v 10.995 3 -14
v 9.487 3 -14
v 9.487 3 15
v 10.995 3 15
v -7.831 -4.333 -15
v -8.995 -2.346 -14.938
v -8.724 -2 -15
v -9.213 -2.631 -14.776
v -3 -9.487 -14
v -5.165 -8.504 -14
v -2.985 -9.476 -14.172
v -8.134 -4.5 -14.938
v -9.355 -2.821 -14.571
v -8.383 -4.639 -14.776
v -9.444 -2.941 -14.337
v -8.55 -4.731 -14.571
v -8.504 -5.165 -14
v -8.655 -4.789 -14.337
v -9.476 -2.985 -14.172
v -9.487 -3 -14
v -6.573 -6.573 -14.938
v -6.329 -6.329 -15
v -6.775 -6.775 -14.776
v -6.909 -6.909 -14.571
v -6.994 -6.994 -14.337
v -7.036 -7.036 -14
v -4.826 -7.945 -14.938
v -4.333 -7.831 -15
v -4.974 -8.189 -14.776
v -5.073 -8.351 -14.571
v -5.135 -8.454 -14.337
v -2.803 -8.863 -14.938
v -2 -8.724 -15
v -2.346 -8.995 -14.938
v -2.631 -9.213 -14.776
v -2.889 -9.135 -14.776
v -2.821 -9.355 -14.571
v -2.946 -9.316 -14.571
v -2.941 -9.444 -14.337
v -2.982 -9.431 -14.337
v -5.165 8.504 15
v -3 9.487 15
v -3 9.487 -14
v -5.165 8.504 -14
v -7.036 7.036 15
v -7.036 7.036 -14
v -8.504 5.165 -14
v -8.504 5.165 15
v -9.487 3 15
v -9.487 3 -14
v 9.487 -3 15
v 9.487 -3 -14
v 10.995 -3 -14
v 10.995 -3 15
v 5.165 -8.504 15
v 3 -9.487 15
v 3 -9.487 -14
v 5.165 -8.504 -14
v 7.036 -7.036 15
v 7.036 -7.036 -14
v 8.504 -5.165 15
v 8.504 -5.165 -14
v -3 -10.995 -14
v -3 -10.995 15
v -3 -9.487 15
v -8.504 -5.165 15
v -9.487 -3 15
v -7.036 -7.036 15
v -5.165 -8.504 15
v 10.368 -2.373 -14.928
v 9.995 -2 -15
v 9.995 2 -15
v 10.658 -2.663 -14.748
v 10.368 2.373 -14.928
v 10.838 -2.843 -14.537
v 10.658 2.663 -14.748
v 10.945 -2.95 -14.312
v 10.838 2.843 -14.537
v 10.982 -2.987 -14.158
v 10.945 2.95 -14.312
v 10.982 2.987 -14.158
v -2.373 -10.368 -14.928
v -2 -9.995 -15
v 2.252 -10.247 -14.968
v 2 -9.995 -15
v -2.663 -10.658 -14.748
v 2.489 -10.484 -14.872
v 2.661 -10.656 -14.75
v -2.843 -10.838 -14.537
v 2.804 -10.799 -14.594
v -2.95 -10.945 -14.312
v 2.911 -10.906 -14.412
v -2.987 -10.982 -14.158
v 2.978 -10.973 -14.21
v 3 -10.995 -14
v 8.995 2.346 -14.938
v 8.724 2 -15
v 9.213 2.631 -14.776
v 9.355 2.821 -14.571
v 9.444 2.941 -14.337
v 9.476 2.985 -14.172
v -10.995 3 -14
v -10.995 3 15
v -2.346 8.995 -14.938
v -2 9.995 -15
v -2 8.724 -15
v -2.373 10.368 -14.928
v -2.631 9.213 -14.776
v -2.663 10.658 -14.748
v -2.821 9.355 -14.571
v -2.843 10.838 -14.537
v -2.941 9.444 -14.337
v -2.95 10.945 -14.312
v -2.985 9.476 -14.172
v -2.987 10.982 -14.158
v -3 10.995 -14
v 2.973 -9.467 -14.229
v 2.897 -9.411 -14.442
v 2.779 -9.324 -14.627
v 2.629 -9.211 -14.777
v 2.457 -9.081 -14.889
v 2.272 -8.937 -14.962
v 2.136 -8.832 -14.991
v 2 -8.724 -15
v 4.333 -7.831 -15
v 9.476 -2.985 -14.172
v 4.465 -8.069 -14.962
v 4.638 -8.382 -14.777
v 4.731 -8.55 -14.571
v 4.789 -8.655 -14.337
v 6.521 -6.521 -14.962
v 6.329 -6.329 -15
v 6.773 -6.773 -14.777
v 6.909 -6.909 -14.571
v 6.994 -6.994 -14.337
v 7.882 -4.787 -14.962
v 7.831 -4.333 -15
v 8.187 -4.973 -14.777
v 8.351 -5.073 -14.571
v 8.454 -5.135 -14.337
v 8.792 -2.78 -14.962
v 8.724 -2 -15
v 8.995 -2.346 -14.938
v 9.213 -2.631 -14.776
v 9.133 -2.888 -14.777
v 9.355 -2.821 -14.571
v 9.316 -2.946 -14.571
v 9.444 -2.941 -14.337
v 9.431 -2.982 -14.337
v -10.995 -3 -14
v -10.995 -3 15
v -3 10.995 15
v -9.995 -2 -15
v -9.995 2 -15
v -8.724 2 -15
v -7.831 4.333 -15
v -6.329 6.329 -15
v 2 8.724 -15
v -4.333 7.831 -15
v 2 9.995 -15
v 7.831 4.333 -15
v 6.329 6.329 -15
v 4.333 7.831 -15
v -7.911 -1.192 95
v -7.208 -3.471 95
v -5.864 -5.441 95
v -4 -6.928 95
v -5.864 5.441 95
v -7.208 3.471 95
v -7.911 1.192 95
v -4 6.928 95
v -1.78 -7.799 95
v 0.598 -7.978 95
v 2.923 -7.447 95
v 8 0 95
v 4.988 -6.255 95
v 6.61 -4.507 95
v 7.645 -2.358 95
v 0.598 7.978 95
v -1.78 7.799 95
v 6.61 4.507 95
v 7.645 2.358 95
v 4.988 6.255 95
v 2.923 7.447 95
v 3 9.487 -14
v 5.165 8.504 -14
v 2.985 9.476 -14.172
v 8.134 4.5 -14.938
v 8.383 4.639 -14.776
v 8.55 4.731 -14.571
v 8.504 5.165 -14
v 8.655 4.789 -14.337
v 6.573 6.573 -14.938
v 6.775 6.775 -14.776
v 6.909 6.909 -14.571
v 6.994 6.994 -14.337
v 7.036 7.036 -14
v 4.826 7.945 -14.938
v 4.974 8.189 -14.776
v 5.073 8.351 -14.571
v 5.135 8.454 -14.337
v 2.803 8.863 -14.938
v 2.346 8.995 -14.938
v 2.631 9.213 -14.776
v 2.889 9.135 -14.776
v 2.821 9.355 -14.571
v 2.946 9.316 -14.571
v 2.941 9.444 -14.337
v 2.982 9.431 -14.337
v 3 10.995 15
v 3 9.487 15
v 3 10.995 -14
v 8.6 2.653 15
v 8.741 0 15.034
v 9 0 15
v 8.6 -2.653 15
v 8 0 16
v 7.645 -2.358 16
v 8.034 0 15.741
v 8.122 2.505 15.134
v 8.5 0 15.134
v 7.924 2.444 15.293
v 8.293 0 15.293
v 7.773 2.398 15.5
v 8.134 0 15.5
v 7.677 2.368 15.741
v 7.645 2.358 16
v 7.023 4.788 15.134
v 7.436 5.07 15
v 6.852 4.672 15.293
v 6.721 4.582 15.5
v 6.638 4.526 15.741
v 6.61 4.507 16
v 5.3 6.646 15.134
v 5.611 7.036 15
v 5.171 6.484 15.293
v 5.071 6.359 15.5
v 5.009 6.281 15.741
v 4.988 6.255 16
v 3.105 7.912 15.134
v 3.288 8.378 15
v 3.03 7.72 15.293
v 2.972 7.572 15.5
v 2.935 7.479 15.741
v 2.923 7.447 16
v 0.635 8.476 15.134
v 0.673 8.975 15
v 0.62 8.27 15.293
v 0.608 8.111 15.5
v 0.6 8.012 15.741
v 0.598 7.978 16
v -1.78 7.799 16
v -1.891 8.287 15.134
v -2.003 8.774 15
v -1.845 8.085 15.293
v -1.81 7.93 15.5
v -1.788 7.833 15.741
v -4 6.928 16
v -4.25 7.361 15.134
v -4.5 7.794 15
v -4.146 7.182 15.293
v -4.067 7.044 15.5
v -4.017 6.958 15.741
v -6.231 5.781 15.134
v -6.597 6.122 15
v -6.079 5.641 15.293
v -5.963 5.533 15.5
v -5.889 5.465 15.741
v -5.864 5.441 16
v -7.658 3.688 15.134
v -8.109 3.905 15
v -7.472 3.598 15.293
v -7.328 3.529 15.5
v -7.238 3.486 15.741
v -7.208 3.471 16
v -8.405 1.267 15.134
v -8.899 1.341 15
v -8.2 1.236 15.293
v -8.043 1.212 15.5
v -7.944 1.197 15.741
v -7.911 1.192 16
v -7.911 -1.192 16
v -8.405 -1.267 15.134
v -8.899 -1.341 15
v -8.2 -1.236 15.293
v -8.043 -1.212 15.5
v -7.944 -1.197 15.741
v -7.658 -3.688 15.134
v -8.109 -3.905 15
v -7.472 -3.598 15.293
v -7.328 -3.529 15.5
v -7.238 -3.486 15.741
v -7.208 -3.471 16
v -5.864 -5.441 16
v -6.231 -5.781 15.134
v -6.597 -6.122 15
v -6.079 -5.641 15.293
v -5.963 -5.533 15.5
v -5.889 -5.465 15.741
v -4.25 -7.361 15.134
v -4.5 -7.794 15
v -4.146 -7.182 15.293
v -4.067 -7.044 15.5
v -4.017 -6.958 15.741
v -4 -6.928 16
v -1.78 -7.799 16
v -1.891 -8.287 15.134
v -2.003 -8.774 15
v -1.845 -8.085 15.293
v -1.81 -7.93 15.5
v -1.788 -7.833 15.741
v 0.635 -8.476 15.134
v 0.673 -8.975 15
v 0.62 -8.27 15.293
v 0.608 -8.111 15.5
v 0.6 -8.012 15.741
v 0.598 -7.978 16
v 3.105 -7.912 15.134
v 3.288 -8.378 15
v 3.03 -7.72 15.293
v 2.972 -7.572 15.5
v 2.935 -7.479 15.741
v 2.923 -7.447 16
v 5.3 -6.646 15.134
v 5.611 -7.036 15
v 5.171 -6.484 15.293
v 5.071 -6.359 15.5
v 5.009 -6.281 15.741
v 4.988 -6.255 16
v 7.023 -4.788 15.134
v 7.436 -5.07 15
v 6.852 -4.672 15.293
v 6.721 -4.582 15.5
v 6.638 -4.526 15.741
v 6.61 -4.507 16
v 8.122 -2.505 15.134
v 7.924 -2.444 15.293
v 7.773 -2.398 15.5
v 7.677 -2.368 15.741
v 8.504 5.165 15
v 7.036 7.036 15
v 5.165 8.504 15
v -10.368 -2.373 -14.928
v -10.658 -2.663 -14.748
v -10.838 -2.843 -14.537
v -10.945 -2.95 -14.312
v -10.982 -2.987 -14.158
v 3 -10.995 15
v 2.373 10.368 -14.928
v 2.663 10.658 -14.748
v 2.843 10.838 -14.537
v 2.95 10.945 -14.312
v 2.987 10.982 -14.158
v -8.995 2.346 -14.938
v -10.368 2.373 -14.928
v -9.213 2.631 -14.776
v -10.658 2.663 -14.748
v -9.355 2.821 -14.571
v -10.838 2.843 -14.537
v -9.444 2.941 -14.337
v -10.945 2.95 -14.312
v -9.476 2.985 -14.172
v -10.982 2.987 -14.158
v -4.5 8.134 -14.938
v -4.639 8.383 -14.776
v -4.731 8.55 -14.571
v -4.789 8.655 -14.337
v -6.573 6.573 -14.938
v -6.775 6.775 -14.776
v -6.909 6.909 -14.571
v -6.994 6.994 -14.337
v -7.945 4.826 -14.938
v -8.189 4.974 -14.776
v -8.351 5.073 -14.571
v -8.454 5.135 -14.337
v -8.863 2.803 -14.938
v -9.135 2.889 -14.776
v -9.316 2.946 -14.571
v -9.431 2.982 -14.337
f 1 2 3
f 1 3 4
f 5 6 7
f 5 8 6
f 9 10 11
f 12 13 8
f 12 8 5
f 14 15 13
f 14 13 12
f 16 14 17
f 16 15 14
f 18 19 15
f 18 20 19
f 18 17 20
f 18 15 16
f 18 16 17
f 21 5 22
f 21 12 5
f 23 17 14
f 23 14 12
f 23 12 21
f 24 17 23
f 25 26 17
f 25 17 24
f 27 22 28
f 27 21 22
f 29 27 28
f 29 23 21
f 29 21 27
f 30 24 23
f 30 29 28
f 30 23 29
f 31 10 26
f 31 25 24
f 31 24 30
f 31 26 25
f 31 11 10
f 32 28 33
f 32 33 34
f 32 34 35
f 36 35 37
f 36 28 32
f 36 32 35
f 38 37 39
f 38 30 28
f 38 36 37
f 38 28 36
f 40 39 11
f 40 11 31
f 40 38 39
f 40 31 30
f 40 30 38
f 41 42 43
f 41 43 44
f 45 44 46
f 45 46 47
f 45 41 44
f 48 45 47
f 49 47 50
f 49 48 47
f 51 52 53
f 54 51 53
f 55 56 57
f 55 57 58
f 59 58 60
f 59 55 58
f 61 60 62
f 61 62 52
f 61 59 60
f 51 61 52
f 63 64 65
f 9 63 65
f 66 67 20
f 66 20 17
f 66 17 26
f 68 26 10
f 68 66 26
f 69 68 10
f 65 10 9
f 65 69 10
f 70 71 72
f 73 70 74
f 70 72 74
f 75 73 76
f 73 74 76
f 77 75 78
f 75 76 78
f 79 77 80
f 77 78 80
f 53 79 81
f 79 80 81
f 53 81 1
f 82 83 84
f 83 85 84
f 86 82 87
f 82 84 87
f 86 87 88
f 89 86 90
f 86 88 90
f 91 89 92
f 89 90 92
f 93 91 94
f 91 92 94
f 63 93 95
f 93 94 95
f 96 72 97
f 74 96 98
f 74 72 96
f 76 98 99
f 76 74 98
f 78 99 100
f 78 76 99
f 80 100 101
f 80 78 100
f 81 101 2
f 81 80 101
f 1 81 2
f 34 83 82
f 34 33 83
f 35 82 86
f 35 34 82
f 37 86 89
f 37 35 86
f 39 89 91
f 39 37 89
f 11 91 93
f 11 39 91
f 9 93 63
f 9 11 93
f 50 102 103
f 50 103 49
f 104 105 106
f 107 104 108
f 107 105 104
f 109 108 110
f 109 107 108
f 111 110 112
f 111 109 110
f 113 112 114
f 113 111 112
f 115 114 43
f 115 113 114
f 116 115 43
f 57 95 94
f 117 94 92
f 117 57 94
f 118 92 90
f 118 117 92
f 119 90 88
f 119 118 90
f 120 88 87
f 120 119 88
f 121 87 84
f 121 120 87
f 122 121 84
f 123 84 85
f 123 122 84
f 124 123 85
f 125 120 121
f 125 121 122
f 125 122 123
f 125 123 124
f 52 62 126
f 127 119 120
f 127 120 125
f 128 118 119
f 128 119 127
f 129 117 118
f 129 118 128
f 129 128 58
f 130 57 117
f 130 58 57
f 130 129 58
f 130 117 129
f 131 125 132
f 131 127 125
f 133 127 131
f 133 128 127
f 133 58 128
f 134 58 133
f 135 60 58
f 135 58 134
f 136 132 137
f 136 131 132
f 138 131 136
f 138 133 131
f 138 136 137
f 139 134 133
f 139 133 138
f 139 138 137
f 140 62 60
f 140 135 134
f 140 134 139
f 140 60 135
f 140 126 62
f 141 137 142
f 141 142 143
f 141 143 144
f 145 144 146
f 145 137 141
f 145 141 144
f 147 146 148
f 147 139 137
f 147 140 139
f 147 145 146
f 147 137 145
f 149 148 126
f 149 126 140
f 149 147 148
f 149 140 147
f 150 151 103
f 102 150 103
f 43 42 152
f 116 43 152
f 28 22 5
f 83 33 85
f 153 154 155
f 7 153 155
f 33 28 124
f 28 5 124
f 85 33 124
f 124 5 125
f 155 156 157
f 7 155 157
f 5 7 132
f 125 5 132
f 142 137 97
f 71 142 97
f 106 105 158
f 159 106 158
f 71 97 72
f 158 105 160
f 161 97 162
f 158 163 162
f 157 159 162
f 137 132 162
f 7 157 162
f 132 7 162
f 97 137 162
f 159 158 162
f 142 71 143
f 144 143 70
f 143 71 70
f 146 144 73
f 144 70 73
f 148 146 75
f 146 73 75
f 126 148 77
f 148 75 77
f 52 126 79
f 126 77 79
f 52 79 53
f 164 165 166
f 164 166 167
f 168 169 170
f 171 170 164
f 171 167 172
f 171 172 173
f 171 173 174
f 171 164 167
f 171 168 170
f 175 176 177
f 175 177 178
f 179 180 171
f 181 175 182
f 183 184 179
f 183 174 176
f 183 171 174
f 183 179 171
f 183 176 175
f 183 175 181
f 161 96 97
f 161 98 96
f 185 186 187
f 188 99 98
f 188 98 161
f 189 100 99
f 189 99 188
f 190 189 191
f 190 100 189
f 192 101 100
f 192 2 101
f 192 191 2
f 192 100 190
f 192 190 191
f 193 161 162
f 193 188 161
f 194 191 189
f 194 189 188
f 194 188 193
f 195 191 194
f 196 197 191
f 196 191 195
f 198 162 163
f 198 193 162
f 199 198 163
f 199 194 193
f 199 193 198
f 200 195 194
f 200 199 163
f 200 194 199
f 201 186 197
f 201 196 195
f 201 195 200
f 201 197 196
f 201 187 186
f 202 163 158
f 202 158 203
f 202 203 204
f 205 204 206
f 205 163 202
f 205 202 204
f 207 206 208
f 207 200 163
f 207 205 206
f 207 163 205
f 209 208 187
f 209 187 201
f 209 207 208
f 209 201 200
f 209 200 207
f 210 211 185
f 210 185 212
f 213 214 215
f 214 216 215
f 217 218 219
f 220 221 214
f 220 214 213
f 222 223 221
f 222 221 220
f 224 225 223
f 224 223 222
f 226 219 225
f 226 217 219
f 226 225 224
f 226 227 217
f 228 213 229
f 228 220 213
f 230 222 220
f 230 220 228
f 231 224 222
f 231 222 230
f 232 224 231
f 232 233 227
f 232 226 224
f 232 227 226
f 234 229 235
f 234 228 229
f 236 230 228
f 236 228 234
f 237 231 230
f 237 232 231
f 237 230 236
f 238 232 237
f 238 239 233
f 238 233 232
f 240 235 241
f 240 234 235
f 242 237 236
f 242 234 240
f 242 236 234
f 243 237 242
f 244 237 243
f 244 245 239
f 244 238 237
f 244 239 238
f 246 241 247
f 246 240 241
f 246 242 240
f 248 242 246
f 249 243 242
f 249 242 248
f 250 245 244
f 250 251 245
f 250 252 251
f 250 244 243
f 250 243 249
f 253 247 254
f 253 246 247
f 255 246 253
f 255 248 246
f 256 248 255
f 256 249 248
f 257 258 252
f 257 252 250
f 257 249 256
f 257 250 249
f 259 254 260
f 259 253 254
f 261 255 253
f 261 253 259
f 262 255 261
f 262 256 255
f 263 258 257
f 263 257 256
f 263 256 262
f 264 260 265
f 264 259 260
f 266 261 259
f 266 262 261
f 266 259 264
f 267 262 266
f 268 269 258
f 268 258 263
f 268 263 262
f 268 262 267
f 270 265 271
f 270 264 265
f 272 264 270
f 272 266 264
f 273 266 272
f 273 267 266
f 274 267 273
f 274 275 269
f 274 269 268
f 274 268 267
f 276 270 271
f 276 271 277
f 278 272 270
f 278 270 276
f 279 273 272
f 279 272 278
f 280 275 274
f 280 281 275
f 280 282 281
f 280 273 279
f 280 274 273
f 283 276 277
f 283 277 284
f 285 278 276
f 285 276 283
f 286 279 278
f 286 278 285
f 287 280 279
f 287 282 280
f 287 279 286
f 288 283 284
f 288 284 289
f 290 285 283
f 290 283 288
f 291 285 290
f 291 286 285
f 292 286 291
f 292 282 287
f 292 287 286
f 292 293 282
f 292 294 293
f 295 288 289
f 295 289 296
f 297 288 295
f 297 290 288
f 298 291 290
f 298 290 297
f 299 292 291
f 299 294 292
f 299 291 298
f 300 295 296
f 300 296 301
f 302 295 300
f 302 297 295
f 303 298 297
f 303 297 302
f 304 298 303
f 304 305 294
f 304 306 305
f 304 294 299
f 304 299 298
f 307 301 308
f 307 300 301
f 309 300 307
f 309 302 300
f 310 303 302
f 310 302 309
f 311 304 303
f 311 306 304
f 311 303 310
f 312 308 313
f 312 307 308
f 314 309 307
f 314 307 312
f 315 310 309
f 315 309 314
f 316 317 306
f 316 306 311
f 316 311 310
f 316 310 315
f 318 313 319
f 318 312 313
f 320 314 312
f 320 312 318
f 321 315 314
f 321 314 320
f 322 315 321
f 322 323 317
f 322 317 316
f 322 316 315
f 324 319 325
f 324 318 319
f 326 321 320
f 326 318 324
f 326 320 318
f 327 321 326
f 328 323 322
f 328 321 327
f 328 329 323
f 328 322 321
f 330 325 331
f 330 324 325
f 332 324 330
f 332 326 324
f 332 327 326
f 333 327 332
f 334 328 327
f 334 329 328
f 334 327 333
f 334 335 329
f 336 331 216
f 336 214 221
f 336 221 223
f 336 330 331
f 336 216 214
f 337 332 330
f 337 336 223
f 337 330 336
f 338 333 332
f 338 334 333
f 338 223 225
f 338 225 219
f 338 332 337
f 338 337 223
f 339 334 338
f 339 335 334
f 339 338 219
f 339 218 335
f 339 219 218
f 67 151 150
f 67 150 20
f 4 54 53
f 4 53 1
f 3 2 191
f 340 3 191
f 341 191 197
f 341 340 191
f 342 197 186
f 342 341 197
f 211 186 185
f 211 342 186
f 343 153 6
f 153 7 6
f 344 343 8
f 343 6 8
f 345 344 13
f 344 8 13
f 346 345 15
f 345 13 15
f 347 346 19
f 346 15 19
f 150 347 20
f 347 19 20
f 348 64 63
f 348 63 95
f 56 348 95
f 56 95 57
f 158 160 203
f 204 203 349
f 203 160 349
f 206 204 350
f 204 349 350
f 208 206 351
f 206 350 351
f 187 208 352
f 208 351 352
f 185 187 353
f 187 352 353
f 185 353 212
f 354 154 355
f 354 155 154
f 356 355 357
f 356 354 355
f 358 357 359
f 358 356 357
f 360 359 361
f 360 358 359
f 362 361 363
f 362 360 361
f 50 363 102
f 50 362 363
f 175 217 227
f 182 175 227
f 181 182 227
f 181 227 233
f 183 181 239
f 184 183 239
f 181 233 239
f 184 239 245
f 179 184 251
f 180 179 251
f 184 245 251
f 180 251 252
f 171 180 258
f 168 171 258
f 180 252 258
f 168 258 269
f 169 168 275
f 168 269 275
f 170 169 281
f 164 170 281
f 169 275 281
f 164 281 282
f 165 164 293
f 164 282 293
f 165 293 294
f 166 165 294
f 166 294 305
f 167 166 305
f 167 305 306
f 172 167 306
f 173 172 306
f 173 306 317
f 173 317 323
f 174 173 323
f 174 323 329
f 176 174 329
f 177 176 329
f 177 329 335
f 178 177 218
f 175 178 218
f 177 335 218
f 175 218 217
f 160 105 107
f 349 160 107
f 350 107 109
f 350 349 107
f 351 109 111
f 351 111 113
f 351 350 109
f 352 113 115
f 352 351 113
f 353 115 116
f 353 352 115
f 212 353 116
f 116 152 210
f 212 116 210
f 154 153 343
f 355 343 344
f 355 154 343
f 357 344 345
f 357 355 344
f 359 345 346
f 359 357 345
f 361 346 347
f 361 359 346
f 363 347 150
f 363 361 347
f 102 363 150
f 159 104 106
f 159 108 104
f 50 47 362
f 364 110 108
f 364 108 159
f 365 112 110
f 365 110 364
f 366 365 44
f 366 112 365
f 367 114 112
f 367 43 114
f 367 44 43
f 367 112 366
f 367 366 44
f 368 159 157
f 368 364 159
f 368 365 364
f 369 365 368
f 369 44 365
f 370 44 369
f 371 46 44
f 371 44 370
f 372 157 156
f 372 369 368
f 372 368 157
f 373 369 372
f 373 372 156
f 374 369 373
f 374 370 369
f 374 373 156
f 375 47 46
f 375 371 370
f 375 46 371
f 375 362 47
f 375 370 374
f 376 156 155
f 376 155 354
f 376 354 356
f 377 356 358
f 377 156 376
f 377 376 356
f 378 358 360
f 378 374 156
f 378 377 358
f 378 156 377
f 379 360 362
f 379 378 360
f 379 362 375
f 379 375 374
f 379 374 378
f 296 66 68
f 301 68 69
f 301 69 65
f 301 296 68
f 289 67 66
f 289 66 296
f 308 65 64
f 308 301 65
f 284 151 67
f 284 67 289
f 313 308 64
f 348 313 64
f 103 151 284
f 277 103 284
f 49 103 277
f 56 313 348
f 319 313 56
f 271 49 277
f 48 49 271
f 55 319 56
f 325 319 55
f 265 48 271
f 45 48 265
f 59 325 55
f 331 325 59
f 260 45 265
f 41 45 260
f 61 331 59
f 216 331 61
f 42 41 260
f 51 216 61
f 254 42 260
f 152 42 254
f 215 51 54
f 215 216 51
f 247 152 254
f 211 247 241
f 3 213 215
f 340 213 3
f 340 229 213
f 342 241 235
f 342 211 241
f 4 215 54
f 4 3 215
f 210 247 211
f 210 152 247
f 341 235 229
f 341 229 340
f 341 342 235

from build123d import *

# Parameters (mm, degrees)
SKETCH1_R           = 9.95
SKETCH1_W           = 6
SKETCH1_H           = 21.99
SKETCH1_W_2         = 21.99
SKETCH1_H_2         = 6
BOSS_EXTRUDE1_DEPTH = 15
SKETCH2_R           = 8
BOSS_EXTRUDE2_DEPTH = 80
FILLET1_R           = 1


with BuildPart() as part:
    # Sketch1 → Boss-Extrude1 (new, symmetric)
    with BuildSketch(Plane.XY):
        Circle(SKETCH1_R)
        Rectangle(SKETCH1_W, SKETCH1_H)
        Rectangle(SKETCH1_W_2, SKETCH1_H_2)
    extrude(amount=BOSS_EXTRUDE1_DEPTH, both=True)

    # Sketch2 → Boss-Extrude2 (add)
    with BuildSketch(Plane.XY.offset(15)):
        Circle(SKETCH2_R)
    extrude(amount=BOSS_EXTRUDE2_DEPTH)

    # Fillet1
    fillet1_edges = [part.edges().sort_by_distance(p)[0] for p in [
        (10.240982371, 3, -15),
        (10.995, 0, -15),
        (10.240982371, -3, -15),
        (-3, 10.240982371, -15),
        (0, 10.995, -15),
        (3, 10.240982371, -15),
        (3, -10.240982371, -15),
        (0, -10.995, -15),
        (-3, -10.240982371, -15),
        (7.035712473, -7.035712473, -15),
        (7.035712473, 7.035712473, -15),
        (-7.035712473, 7.035712473, -15),
        (-7.035712473, -7.035712473, -15),
        (-8, 0, 15),
        (-10.240982371, -3, -15),
        (-10.995, 0, -15),
        (-10.240982371, 3, -15),
    ]]
    fillet(fillet1_edges, radius=FILLET1_R)


solid = part.part
